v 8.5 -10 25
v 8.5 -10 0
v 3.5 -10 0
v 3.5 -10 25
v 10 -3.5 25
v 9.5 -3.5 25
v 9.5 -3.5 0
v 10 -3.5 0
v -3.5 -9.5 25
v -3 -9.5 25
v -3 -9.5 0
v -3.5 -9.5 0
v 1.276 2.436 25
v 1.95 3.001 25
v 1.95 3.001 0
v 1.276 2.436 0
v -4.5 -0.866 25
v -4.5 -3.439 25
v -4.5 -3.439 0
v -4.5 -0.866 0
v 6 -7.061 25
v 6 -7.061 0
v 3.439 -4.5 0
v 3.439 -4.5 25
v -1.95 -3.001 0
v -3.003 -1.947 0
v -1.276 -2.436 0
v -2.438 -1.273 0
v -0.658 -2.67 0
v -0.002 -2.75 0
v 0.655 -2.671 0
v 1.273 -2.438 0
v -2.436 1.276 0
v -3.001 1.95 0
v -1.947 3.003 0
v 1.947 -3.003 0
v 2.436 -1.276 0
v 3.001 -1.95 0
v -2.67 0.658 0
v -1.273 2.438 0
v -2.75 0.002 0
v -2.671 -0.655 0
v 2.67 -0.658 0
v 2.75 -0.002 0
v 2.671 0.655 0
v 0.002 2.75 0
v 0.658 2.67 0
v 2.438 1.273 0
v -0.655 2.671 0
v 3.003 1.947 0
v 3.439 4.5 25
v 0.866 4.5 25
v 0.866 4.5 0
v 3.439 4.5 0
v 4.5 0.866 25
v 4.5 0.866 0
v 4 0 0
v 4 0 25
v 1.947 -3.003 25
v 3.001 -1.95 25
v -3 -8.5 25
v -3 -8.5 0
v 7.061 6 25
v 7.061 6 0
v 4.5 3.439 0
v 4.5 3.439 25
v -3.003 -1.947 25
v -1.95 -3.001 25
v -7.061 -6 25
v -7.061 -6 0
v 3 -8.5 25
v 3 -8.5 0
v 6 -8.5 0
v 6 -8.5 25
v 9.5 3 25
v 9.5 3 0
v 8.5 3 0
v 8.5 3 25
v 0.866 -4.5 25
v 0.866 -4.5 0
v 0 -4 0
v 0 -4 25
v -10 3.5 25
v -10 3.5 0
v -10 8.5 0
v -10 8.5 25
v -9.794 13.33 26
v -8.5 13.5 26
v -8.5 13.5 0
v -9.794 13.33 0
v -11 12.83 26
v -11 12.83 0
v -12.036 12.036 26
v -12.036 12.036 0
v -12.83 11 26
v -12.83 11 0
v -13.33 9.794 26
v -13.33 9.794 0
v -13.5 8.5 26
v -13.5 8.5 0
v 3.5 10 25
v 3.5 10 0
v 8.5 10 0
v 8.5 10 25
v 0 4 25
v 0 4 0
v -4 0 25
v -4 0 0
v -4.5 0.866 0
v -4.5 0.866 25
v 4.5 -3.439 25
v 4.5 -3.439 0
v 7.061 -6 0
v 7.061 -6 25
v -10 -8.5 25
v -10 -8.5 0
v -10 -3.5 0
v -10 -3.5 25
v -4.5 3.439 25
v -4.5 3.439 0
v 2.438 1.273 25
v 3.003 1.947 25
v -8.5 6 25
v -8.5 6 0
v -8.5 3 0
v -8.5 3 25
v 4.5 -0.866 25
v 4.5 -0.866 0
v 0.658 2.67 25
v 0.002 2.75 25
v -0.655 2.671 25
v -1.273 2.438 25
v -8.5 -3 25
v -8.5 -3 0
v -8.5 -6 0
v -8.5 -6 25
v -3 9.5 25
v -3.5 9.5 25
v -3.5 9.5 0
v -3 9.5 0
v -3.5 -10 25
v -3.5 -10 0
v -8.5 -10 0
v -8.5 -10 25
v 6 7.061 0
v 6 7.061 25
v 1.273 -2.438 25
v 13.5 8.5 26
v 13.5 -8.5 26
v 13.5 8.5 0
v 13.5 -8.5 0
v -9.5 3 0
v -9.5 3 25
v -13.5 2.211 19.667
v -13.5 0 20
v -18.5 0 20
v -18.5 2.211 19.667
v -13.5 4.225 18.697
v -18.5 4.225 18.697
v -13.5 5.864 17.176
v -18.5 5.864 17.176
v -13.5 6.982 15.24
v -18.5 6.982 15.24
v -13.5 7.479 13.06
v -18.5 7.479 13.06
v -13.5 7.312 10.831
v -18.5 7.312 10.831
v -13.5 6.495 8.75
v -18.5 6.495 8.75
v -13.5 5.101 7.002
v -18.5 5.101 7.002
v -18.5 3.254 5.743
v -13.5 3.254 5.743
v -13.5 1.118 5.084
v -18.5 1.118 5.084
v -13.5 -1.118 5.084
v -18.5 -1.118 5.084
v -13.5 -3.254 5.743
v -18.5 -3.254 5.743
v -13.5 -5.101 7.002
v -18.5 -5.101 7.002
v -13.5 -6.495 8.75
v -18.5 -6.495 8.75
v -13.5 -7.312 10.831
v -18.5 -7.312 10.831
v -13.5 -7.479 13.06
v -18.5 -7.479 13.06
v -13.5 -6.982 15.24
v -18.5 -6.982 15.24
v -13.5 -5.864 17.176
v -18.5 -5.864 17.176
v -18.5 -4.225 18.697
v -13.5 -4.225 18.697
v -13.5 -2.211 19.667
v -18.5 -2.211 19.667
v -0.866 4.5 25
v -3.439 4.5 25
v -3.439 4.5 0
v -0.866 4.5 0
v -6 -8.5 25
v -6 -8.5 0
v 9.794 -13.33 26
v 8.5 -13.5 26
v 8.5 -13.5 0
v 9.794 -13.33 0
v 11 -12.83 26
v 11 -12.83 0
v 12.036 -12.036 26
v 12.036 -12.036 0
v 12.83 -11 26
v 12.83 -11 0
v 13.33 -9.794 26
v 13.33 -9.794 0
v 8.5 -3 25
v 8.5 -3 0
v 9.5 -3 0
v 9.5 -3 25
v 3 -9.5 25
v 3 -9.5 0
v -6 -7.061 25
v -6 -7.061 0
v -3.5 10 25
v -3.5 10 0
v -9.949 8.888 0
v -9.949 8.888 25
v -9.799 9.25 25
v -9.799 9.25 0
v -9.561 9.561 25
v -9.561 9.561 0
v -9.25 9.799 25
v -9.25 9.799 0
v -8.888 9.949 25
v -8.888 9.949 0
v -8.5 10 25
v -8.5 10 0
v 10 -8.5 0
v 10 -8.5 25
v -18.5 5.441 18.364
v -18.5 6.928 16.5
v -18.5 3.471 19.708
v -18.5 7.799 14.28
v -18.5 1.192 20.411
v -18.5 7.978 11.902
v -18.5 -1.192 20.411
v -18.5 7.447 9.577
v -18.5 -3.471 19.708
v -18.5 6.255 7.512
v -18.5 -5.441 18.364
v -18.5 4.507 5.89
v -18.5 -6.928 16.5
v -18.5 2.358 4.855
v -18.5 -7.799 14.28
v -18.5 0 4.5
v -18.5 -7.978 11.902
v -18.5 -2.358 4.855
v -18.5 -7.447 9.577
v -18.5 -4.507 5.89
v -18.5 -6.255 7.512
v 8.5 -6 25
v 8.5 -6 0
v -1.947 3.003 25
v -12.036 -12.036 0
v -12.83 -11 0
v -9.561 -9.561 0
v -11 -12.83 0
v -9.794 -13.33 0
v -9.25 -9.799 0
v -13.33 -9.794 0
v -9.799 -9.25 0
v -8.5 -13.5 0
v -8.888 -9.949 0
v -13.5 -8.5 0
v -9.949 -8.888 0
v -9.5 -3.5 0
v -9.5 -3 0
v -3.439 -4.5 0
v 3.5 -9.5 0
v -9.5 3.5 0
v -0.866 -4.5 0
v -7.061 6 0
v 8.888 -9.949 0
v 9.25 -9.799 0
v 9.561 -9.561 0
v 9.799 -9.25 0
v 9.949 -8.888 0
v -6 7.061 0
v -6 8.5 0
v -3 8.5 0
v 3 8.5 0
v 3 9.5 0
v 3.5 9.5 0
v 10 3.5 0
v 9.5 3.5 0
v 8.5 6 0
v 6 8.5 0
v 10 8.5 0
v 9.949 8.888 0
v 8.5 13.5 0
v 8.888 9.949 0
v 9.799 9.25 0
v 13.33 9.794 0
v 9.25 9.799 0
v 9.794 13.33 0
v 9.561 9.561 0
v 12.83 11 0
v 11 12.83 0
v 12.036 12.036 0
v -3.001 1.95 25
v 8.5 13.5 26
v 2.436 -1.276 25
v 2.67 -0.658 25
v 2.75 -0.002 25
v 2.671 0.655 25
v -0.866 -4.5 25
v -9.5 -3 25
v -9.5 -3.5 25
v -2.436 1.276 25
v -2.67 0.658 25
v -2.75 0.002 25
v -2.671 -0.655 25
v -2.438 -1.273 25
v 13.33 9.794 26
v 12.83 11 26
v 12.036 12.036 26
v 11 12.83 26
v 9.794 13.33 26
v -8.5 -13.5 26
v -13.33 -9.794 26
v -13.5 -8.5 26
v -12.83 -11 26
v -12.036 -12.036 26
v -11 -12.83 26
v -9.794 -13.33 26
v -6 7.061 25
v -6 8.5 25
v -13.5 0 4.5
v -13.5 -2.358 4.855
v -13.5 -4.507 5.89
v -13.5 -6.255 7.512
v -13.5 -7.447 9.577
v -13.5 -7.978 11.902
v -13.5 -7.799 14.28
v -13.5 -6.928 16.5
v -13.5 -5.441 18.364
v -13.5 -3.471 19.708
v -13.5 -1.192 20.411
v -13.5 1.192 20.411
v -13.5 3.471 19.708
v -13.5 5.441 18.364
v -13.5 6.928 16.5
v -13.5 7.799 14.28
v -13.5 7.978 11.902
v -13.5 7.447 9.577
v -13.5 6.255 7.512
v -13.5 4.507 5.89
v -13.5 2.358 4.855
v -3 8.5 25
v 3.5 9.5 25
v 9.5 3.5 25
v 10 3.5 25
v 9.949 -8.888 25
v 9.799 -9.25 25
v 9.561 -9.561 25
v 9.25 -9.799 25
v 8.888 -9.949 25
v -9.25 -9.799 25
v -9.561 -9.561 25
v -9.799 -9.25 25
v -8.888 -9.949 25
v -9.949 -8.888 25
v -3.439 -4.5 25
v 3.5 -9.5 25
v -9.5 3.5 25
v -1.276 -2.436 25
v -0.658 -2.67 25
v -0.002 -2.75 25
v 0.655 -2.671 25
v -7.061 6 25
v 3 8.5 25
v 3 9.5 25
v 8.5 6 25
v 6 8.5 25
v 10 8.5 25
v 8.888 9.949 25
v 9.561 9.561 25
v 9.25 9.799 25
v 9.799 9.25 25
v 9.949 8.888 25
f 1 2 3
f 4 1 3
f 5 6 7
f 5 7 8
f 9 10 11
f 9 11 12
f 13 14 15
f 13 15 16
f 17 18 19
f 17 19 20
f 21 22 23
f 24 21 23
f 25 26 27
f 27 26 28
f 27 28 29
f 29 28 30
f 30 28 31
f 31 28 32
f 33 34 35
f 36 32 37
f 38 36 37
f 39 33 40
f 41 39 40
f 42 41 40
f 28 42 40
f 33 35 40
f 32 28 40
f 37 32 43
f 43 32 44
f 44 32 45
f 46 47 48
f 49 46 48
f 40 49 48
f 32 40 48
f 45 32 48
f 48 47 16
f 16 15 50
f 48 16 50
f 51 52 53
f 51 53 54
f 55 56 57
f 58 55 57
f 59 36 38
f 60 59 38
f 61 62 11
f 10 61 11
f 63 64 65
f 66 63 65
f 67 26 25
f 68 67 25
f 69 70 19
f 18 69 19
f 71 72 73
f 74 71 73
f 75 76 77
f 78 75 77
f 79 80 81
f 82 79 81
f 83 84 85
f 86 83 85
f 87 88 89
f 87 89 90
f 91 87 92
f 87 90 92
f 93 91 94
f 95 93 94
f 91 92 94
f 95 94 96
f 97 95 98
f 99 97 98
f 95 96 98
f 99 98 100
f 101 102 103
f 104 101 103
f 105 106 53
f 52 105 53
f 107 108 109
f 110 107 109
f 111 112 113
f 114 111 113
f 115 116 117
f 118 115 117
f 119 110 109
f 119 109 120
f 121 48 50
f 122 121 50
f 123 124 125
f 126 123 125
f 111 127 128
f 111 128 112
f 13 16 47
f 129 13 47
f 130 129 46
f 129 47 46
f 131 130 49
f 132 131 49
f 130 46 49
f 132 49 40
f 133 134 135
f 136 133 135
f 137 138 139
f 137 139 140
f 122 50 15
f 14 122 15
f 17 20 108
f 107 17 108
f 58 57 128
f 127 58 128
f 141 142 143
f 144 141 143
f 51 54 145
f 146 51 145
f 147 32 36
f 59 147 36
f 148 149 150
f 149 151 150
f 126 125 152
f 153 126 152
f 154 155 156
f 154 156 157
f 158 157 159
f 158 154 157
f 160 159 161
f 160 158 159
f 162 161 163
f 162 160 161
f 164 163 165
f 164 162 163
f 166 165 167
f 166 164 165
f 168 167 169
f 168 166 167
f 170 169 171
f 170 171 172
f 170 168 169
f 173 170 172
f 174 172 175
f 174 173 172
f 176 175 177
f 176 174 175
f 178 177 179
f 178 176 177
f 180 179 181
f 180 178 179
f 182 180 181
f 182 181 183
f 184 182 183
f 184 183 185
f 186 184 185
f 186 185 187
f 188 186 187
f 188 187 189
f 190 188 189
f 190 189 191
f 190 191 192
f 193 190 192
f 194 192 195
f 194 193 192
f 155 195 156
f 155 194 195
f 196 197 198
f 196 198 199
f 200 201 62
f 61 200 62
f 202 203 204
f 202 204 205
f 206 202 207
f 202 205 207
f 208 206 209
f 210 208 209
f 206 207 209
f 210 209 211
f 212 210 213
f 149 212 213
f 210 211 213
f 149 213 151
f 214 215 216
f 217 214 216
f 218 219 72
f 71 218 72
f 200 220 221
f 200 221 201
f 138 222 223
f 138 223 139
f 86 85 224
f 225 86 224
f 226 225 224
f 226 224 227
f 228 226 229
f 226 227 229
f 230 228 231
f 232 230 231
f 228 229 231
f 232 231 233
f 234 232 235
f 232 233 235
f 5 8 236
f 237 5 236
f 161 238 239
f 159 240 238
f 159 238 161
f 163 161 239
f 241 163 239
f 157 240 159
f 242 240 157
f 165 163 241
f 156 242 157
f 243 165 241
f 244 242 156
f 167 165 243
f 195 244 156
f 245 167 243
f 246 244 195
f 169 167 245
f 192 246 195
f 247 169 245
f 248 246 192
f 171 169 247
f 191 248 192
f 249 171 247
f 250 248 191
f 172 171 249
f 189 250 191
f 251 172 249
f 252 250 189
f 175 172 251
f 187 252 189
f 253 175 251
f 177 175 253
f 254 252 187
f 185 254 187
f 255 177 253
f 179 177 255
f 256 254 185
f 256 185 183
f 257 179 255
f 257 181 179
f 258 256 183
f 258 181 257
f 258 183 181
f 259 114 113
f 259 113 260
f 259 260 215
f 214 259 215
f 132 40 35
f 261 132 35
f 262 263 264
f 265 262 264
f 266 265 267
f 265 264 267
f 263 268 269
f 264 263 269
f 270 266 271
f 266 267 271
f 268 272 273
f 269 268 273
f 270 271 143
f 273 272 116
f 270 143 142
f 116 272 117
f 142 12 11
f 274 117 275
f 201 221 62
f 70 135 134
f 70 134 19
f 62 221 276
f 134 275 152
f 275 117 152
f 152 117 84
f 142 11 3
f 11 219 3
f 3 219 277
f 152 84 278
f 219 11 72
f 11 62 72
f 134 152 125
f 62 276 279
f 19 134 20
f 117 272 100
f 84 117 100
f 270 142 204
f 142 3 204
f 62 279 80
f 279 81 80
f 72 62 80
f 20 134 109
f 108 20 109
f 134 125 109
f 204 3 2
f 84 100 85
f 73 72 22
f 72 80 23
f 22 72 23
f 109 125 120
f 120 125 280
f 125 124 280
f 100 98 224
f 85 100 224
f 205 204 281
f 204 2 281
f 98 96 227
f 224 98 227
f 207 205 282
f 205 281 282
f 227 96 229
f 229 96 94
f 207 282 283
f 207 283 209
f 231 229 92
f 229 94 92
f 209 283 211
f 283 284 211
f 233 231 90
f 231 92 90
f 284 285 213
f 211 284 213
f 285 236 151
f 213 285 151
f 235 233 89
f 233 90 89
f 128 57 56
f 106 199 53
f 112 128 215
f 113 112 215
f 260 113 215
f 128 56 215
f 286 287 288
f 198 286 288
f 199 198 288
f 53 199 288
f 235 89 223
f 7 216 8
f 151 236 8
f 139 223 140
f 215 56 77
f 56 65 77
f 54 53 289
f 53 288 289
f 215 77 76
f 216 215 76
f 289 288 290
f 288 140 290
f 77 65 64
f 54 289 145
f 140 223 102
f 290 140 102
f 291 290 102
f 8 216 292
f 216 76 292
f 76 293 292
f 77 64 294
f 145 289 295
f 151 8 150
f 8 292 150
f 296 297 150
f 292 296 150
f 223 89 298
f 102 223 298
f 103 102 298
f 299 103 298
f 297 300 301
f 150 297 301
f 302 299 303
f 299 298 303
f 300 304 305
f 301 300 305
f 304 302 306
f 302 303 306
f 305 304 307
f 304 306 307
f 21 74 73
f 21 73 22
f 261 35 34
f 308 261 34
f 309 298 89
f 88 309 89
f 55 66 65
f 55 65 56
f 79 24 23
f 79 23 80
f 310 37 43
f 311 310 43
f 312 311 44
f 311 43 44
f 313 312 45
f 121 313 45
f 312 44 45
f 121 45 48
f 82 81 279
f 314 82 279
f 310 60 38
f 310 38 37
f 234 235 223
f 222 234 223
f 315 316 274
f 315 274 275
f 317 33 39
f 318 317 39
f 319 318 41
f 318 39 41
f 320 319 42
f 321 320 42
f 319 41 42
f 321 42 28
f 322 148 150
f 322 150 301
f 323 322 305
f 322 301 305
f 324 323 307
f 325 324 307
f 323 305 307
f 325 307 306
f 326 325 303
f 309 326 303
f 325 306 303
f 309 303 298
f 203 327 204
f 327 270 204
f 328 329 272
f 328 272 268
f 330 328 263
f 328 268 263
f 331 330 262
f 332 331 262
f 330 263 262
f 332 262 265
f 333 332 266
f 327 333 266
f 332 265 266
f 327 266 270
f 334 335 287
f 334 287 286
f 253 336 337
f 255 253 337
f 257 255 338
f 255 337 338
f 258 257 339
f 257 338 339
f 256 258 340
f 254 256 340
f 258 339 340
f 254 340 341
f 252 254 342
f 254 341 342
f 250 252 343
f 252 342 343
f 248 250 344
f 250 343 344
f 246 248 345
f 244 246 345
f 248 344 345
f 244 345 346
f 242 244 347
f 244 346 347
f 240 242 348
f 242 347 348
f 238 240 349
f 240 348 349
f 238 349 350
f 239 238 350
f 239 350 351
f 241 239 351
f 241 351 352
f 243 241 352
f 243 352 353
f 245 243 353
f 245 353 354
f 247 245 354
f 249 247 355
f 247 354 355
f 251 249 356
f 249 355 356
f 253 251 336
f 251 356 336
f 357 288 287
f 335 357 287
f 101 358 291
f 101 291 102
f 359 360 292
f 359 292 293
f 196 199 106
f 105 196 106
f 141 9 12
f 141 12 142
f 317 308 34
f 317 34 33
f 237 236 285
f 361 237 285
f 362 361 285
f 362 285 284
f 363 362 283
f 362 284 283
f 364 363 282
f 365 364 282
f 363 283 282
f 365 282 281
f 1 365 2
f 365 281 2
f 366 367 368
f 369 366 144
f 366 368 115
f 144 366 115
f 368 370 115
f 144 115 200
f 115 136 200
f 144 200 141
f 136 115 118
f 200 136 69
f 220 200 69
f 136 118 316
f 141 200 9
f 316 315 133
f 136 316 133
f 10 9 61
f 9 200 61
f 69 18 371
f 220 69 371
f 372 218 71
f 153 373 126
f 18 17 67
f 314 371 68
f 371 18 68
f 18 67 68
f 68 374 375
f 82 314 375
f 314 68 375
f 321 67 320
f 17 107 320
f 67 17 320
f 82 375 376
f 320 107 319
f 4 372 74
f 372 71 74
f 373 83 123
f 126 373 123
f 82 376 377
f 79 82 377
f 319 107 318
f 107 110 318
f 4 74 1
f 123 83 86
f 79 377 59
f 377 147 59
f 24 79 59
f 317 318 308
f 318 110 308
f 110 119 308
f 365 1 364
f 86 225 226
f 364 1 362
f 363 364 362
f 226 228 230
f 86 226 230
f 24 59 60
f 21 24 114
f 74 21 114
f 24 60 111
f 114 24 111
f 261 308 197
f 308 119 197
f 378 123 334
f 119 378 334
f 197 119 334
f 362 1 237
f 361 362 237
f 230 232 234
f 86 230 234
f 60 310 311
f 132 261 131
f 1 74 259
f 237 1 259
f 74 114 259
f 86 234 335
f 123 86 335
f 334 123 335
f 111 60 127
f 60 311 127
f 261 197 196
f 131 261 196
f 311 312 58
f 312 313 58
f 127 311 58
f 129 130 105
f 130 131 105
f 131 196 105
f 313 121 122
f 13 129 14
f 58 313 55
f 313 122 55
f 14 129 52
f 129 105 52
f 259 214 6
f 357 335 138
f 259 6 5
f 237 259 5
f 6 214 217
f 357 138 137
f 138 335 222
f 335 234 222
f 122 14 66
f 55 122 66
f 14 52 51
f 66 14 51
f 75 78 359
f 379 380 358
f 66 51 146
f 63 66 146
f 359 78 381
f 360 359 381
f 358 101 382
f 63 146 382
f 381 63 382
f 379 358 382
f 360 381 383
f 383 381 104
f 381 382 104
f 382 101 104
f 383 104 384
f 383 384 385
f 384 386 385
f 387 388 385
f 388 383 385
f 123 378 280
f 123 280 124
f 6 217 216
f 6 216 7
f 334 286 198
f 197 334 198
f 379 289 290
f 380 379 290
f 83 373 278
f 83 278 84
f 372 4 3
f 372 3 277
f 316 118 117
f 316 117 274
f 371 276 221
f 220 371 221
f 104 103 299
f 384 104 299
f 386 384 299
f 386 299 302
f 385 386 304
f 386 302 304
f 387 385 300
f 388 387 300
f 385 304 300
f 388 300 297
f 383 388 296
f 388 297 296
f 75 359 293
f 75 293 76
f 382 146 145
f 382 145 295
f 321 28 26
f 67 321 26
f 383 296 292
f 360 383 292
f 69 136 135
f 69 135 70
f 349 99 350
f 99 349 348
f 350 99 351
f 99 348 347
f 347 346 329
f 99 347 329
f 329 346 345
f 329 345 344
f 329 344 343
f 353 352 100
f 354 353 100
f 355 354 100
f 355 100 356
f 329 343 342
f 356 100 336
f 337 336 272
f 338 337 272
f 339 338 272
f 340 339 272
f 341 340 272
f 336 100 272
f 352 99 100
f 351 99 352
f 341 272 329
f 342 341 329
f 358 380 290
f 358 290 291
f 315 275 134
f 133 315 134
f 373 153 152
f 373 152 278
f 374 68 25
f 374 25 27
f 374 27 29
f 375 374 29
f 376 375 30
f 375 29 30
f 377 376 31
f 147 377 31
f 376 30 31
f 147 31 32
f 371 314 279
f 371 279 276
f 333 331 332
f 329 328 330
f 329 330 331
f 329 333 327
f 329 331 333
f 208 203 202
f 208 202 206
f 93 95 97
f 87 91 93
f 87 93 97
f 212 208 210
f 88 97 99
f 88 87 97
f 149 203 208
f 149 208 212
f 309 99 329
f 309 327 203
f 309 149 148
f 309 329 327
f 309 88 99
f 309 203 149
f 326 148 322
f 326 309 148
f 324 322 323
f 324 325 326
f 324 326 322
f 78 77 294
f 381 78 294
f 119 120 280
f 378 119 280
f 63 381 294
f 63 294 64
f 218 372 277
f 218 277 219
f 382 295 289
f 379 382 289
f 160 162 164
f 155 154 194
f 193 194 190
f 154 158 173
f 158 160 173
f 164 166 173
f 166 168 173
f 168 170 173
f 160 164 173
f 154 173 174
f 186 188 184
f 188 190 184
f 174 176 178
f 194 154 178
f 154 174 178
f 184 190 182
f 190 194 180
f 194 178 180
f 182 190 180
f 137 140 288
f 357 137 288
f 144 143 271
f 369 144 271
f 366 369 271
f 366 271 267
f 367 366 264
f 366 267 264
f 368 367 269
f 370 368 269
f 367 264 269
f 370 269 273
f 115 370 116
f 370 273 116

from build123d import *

# Parameters (mm, degrees)
BOSS_EXTRU_5_DEPTH = 25
ESQUISSE7_R        = 8
ESQUISSE7_R_2      = 7.5
BOSS_EXTRU_7_DEPTH = 5
BOSS_EXTRU_6_DEPTH = 1


# Read off the part's stored shape, not the designer's step: Boss.-Extru.5
with BuildPart() as part:
    # Boss.-Extru.5 outline → Boss.-Extru.5 (new body)
    # profile 1 of 2: a face of its own
    with BuildSketch(Plane.XY):
        with BuildLine():
            Line((-8.5, -13.5), (8.5, -13.5))
            ThreePointArc((8.5, -13.5), (12.035533906, -12.035533906), (13.5, -8.5))
            Line((13.5, -8.5), (13.5, 8.5))
            ThreePointArc((13.5, 8.5), (12.035533906, 12.035533906), (8.5, 13.5))
            Line((8.5, 13.5), (-8.5, 13.5))
            ThreePointArc((-8.5, 13.5), (-12.035533906, 12.035533906), (-13.5, 8.5))
            Line((-13.5, 8.5), (-13.5, -8.5))
            ThreePointArc((-13.5, -8.5), (-12.035533906, -12.035533906), (-8.5, -13.5))
        make_face()
        with BuildLine():
            Line((-10, 3.5), (-10, 8.5))
            ThreePointArc((-10, 8.5), (-9.560660172, 9.560660172), (-8.5, 10))
            Line((-8.5, 10), (-3.5, 10))
            Line((-3.5, 10), (-3.5, 9.5))
            Line((-3.5, 9.5), (-3, 9.5))
            Line((-3, 9.5), (-3, 8.5))
            Line((-3, 8.5), (-6, 8.5))
            Line((-6, 8.5), (-6, 7.060660172))
            Line((-6, 7.060660172), (-3.439339828, 4.5))
            Line((-3.439339828, 4.5), (-0.866025404, 4.5))
            Line((-0.866025404, 4.5), (0, 4))
            Line((0, 4), (0.866025404, 4.5))
            Line((0.866025404, 4.5), (3.439339828, 4.5))
            Line((3.439339828, 4.5), (6, 7.060660172))
            Line((6, 7.060660172), (6, 8.5))
            Line((6, 8.5), (3, 8.5))
            Line((3, 8.5), (3, 9.5))
            Line((3, 9.5), (3.5, 9.5))
            Line((3.5, 9.5), (3.5, 10))
            Line((3.5, 10), (8.5, 10))
            ThreePointArc((8.5, 10), (9.560660172, 9.560660172), (10, 8.5))
            Line((10, 8.5), (10, 3.5))
            Line((10, 3.5), (9.5, 3.5))
            Line((9.5, 3.5), (9.5, 3))
            Line((9.5, 3), (8.5, 3))
            Line((8.5, 3), (8.5, 6))
            Line((8.5, 6), (7.060660172, 6))
            Line((7.060660172, 6), (4.5, 3.439339828))
            Line((4.5, 3.439339828), (4.5, 0.866025404))
            Line((4.5, 0.866025404), (4, 0))
            Line((4, 0), (4.5, -0.866025404))
            Line((4.5, -0.866025404), (4.5, -3.439339828))
            Line((4.5, -3.439339828), (7.060660172, -6))
            Line((7.060660172, -6), (8.5, -6))
            Line((8.5, -6), (8.5, -3))
            Line((8.5, -3), (9.5, -3))
            Line((9.5, -3), (9.5, -3.5))
            Line((9.5, -3.5), (10, -3.5))
            Line((10, -3.5), (10, -8.5))
            ThreePointArc((10, -8.5), (9.560660172, -9.560660172), (8.5, -10))
            Line((8.5, -10), (3.5, -10))
            Line((3.5, -10), (3.5, -9.5))
            Line((3.5, -9.5), (3, -9.5))
            Line((3, -9.5), (3, -8.5))
            Line((3, -8.5), (6, -8.5))
            Line((6, -8.5), (6, -7.060660172))
            Line((6, -7.060660172), (3.439339828, -4.5))
            Line((3.439339828, -4.5), (0.866025404, -4.5))
            Line((0.866025404, -4.5), (0, -4))
            Line((0, -4), (-0.866025404, -4.5))
            Line((-0.866025404, -4.5), (-3.439339828, -4.5))
            Line((-3.439339828, -4.5), (-6, -7.060660172))
            Line((-6, -7.060660172), (-6, -8.5))
            Line((-6, -8.5), (-3, -8.5))
            Line((-3, -8.5), (-3, -9.5))
            Line((-3, -9.5), (-3.5, -9.5))
            Line((-3.5, -9.5), (-3.5, -10))
            Line((-3.5, -10), (-8.5, -10))
            ThreePointArc((-8.5, -10), (-9.560660172, -9.560660172), (-10, -8.5))
            Line((-10, -8.5), (-10, -3.5))
            Line((-10, -3.5), (-9.5, -3.5))
            Line((-9.5, -3.5), (-9.5, -3))
            Line((-9.5, -3), (-8.5, -3))
            Line((-8.5, -3), (-8.5, -6))
            Line((-8.5, -6), (-7.060660172, -6))
            Line((-7.060660172, -6), (-4.5, -3.439339828))
            Line((-4.5, -3.439339828), (-4.5, -0.866025404))
            Line((-4.5, -0.866025404), (-4, 0))
            Line((-4, 0), (-4.5, 0.866025404))
            Line((-4.5, 0.866025404), (-4.5, 3.439339828))
            Line((-4.5, 3.439339828), (-7.060660172, 6))
            Line((-7.060660172, 6), (-8.5, 6))
            Line((-8.5, 6), (-8.5, 3))
            Line((-8.5, 3), (-9.5, 3))
            Line((-9.5, 3), (-9.5, 3.5))
            Line((-9.5, 3.5), (-10, 3.5))
        make_face(mode=Mode.SUBTRACT)
    # profile 2 of 2: a face of its own
    with BuildSketch(Plane.XY):
        with BuildLine():
            Line((1.949592103, 3.000876196), (1.276279893, 2.435900169))
            ThreePointArc((1.276279893, 2.435900169), (0.001756003, 2.749999439), (-1.273167982, 2.43752811))
            Line((-1.273167982, 2.43752811), (-1.947287092, 3.003181207))
            Line((-1.947287092, 3.003181207), (-3.000876196, 1.949592103))
            Line((-3.000876196, 1.949592103), (-2.435900169, 1.276279893))
            ThreePointArc((-2.435900169, 1.276279893), (-2.749999439, 0.001756003), (-2.43752811, -1.273167982))
            Line((-2.43752811, -1.273167982), (-3.003181207, -1.947287092))
            Line((-3.003181207, -1.947287092), (-1.949592103, -3.000876196))
            Line((-1.949592103, -3.000876196), (-1.276279893, -2.435900169))
            ThreePointArc((-1.276279893, -2.435900169), (-0.001756003, -2.749999439), (1.273167982, -2.43752811))
            Line((1.273167982, -2.43752811), (1.947287092, -3.003181207))
            Line((1.947287092, -3.003181207), (3.000876196, -1.949592103))
            Line((3.000876196, -1.949592103), (2.435900169, -1.276279893))
            ThreePointArc((2.435900169, -1.276279893), (2.749999439, -0.001756003), (2.43752811, 1.273167982))
            Line((2.43752811, 1.273167982), (3.003181207, 1.947287092))
            Line((3.003181207, 1.947287092), (1.949592103, 3.000876196))
        make_face()
    extrude(amount=BOSS_EXTRU_5_DEPTH)

    # Esquisse7 → Boss.-Extru.7 (add)
    with BuildSketch(Plane.ZY.offset(13.5)):
        with Locations(Location((12.5, 0, 0), (0, 0, 180))):
            Circle(ESQUISSE7_R)
        with Locations((12.5, 0)):
            Circle(ESQUISSE7_R_2, mode=Mode.SUBTRACT)
    extrude(amount=BOSS_EXTRU_7_DEPTH)

    # Esquisse6 → Boss.-Extru.6 (add)
    with BuildSketch(Plane.XY.offset(25)):
        with BuildLine():
            Line((-13.5, 8.5), (-13.5, -8.5))
            ThreePointArc((-13.5, -8.5), (-12.035533906, -12.035533906), (-8.5, -13.5))
            Line((-8.5, -13.5), (8.5, -13.5))
            ThreePointArc((8.5, -13.5), (12.035533906, -12.035533906), (13.5, -8.5))
            Line((13.5, -8.5), (13.5, 8.5))
            ThreePointArc((13.5, 8.5), (12.035533906, 12.035533906), (8.5, 13.5))
            Line((8.5, 13.5), (-8.5, 13.5))
            ThreePointArc((-8.5, 13.5), (-12.035533906, 12.035533906), (-13.5, 8.5))
        make_face()
    extrude(amount=BOSS_EXTRU_6_DEPTH)


solid = part.part
